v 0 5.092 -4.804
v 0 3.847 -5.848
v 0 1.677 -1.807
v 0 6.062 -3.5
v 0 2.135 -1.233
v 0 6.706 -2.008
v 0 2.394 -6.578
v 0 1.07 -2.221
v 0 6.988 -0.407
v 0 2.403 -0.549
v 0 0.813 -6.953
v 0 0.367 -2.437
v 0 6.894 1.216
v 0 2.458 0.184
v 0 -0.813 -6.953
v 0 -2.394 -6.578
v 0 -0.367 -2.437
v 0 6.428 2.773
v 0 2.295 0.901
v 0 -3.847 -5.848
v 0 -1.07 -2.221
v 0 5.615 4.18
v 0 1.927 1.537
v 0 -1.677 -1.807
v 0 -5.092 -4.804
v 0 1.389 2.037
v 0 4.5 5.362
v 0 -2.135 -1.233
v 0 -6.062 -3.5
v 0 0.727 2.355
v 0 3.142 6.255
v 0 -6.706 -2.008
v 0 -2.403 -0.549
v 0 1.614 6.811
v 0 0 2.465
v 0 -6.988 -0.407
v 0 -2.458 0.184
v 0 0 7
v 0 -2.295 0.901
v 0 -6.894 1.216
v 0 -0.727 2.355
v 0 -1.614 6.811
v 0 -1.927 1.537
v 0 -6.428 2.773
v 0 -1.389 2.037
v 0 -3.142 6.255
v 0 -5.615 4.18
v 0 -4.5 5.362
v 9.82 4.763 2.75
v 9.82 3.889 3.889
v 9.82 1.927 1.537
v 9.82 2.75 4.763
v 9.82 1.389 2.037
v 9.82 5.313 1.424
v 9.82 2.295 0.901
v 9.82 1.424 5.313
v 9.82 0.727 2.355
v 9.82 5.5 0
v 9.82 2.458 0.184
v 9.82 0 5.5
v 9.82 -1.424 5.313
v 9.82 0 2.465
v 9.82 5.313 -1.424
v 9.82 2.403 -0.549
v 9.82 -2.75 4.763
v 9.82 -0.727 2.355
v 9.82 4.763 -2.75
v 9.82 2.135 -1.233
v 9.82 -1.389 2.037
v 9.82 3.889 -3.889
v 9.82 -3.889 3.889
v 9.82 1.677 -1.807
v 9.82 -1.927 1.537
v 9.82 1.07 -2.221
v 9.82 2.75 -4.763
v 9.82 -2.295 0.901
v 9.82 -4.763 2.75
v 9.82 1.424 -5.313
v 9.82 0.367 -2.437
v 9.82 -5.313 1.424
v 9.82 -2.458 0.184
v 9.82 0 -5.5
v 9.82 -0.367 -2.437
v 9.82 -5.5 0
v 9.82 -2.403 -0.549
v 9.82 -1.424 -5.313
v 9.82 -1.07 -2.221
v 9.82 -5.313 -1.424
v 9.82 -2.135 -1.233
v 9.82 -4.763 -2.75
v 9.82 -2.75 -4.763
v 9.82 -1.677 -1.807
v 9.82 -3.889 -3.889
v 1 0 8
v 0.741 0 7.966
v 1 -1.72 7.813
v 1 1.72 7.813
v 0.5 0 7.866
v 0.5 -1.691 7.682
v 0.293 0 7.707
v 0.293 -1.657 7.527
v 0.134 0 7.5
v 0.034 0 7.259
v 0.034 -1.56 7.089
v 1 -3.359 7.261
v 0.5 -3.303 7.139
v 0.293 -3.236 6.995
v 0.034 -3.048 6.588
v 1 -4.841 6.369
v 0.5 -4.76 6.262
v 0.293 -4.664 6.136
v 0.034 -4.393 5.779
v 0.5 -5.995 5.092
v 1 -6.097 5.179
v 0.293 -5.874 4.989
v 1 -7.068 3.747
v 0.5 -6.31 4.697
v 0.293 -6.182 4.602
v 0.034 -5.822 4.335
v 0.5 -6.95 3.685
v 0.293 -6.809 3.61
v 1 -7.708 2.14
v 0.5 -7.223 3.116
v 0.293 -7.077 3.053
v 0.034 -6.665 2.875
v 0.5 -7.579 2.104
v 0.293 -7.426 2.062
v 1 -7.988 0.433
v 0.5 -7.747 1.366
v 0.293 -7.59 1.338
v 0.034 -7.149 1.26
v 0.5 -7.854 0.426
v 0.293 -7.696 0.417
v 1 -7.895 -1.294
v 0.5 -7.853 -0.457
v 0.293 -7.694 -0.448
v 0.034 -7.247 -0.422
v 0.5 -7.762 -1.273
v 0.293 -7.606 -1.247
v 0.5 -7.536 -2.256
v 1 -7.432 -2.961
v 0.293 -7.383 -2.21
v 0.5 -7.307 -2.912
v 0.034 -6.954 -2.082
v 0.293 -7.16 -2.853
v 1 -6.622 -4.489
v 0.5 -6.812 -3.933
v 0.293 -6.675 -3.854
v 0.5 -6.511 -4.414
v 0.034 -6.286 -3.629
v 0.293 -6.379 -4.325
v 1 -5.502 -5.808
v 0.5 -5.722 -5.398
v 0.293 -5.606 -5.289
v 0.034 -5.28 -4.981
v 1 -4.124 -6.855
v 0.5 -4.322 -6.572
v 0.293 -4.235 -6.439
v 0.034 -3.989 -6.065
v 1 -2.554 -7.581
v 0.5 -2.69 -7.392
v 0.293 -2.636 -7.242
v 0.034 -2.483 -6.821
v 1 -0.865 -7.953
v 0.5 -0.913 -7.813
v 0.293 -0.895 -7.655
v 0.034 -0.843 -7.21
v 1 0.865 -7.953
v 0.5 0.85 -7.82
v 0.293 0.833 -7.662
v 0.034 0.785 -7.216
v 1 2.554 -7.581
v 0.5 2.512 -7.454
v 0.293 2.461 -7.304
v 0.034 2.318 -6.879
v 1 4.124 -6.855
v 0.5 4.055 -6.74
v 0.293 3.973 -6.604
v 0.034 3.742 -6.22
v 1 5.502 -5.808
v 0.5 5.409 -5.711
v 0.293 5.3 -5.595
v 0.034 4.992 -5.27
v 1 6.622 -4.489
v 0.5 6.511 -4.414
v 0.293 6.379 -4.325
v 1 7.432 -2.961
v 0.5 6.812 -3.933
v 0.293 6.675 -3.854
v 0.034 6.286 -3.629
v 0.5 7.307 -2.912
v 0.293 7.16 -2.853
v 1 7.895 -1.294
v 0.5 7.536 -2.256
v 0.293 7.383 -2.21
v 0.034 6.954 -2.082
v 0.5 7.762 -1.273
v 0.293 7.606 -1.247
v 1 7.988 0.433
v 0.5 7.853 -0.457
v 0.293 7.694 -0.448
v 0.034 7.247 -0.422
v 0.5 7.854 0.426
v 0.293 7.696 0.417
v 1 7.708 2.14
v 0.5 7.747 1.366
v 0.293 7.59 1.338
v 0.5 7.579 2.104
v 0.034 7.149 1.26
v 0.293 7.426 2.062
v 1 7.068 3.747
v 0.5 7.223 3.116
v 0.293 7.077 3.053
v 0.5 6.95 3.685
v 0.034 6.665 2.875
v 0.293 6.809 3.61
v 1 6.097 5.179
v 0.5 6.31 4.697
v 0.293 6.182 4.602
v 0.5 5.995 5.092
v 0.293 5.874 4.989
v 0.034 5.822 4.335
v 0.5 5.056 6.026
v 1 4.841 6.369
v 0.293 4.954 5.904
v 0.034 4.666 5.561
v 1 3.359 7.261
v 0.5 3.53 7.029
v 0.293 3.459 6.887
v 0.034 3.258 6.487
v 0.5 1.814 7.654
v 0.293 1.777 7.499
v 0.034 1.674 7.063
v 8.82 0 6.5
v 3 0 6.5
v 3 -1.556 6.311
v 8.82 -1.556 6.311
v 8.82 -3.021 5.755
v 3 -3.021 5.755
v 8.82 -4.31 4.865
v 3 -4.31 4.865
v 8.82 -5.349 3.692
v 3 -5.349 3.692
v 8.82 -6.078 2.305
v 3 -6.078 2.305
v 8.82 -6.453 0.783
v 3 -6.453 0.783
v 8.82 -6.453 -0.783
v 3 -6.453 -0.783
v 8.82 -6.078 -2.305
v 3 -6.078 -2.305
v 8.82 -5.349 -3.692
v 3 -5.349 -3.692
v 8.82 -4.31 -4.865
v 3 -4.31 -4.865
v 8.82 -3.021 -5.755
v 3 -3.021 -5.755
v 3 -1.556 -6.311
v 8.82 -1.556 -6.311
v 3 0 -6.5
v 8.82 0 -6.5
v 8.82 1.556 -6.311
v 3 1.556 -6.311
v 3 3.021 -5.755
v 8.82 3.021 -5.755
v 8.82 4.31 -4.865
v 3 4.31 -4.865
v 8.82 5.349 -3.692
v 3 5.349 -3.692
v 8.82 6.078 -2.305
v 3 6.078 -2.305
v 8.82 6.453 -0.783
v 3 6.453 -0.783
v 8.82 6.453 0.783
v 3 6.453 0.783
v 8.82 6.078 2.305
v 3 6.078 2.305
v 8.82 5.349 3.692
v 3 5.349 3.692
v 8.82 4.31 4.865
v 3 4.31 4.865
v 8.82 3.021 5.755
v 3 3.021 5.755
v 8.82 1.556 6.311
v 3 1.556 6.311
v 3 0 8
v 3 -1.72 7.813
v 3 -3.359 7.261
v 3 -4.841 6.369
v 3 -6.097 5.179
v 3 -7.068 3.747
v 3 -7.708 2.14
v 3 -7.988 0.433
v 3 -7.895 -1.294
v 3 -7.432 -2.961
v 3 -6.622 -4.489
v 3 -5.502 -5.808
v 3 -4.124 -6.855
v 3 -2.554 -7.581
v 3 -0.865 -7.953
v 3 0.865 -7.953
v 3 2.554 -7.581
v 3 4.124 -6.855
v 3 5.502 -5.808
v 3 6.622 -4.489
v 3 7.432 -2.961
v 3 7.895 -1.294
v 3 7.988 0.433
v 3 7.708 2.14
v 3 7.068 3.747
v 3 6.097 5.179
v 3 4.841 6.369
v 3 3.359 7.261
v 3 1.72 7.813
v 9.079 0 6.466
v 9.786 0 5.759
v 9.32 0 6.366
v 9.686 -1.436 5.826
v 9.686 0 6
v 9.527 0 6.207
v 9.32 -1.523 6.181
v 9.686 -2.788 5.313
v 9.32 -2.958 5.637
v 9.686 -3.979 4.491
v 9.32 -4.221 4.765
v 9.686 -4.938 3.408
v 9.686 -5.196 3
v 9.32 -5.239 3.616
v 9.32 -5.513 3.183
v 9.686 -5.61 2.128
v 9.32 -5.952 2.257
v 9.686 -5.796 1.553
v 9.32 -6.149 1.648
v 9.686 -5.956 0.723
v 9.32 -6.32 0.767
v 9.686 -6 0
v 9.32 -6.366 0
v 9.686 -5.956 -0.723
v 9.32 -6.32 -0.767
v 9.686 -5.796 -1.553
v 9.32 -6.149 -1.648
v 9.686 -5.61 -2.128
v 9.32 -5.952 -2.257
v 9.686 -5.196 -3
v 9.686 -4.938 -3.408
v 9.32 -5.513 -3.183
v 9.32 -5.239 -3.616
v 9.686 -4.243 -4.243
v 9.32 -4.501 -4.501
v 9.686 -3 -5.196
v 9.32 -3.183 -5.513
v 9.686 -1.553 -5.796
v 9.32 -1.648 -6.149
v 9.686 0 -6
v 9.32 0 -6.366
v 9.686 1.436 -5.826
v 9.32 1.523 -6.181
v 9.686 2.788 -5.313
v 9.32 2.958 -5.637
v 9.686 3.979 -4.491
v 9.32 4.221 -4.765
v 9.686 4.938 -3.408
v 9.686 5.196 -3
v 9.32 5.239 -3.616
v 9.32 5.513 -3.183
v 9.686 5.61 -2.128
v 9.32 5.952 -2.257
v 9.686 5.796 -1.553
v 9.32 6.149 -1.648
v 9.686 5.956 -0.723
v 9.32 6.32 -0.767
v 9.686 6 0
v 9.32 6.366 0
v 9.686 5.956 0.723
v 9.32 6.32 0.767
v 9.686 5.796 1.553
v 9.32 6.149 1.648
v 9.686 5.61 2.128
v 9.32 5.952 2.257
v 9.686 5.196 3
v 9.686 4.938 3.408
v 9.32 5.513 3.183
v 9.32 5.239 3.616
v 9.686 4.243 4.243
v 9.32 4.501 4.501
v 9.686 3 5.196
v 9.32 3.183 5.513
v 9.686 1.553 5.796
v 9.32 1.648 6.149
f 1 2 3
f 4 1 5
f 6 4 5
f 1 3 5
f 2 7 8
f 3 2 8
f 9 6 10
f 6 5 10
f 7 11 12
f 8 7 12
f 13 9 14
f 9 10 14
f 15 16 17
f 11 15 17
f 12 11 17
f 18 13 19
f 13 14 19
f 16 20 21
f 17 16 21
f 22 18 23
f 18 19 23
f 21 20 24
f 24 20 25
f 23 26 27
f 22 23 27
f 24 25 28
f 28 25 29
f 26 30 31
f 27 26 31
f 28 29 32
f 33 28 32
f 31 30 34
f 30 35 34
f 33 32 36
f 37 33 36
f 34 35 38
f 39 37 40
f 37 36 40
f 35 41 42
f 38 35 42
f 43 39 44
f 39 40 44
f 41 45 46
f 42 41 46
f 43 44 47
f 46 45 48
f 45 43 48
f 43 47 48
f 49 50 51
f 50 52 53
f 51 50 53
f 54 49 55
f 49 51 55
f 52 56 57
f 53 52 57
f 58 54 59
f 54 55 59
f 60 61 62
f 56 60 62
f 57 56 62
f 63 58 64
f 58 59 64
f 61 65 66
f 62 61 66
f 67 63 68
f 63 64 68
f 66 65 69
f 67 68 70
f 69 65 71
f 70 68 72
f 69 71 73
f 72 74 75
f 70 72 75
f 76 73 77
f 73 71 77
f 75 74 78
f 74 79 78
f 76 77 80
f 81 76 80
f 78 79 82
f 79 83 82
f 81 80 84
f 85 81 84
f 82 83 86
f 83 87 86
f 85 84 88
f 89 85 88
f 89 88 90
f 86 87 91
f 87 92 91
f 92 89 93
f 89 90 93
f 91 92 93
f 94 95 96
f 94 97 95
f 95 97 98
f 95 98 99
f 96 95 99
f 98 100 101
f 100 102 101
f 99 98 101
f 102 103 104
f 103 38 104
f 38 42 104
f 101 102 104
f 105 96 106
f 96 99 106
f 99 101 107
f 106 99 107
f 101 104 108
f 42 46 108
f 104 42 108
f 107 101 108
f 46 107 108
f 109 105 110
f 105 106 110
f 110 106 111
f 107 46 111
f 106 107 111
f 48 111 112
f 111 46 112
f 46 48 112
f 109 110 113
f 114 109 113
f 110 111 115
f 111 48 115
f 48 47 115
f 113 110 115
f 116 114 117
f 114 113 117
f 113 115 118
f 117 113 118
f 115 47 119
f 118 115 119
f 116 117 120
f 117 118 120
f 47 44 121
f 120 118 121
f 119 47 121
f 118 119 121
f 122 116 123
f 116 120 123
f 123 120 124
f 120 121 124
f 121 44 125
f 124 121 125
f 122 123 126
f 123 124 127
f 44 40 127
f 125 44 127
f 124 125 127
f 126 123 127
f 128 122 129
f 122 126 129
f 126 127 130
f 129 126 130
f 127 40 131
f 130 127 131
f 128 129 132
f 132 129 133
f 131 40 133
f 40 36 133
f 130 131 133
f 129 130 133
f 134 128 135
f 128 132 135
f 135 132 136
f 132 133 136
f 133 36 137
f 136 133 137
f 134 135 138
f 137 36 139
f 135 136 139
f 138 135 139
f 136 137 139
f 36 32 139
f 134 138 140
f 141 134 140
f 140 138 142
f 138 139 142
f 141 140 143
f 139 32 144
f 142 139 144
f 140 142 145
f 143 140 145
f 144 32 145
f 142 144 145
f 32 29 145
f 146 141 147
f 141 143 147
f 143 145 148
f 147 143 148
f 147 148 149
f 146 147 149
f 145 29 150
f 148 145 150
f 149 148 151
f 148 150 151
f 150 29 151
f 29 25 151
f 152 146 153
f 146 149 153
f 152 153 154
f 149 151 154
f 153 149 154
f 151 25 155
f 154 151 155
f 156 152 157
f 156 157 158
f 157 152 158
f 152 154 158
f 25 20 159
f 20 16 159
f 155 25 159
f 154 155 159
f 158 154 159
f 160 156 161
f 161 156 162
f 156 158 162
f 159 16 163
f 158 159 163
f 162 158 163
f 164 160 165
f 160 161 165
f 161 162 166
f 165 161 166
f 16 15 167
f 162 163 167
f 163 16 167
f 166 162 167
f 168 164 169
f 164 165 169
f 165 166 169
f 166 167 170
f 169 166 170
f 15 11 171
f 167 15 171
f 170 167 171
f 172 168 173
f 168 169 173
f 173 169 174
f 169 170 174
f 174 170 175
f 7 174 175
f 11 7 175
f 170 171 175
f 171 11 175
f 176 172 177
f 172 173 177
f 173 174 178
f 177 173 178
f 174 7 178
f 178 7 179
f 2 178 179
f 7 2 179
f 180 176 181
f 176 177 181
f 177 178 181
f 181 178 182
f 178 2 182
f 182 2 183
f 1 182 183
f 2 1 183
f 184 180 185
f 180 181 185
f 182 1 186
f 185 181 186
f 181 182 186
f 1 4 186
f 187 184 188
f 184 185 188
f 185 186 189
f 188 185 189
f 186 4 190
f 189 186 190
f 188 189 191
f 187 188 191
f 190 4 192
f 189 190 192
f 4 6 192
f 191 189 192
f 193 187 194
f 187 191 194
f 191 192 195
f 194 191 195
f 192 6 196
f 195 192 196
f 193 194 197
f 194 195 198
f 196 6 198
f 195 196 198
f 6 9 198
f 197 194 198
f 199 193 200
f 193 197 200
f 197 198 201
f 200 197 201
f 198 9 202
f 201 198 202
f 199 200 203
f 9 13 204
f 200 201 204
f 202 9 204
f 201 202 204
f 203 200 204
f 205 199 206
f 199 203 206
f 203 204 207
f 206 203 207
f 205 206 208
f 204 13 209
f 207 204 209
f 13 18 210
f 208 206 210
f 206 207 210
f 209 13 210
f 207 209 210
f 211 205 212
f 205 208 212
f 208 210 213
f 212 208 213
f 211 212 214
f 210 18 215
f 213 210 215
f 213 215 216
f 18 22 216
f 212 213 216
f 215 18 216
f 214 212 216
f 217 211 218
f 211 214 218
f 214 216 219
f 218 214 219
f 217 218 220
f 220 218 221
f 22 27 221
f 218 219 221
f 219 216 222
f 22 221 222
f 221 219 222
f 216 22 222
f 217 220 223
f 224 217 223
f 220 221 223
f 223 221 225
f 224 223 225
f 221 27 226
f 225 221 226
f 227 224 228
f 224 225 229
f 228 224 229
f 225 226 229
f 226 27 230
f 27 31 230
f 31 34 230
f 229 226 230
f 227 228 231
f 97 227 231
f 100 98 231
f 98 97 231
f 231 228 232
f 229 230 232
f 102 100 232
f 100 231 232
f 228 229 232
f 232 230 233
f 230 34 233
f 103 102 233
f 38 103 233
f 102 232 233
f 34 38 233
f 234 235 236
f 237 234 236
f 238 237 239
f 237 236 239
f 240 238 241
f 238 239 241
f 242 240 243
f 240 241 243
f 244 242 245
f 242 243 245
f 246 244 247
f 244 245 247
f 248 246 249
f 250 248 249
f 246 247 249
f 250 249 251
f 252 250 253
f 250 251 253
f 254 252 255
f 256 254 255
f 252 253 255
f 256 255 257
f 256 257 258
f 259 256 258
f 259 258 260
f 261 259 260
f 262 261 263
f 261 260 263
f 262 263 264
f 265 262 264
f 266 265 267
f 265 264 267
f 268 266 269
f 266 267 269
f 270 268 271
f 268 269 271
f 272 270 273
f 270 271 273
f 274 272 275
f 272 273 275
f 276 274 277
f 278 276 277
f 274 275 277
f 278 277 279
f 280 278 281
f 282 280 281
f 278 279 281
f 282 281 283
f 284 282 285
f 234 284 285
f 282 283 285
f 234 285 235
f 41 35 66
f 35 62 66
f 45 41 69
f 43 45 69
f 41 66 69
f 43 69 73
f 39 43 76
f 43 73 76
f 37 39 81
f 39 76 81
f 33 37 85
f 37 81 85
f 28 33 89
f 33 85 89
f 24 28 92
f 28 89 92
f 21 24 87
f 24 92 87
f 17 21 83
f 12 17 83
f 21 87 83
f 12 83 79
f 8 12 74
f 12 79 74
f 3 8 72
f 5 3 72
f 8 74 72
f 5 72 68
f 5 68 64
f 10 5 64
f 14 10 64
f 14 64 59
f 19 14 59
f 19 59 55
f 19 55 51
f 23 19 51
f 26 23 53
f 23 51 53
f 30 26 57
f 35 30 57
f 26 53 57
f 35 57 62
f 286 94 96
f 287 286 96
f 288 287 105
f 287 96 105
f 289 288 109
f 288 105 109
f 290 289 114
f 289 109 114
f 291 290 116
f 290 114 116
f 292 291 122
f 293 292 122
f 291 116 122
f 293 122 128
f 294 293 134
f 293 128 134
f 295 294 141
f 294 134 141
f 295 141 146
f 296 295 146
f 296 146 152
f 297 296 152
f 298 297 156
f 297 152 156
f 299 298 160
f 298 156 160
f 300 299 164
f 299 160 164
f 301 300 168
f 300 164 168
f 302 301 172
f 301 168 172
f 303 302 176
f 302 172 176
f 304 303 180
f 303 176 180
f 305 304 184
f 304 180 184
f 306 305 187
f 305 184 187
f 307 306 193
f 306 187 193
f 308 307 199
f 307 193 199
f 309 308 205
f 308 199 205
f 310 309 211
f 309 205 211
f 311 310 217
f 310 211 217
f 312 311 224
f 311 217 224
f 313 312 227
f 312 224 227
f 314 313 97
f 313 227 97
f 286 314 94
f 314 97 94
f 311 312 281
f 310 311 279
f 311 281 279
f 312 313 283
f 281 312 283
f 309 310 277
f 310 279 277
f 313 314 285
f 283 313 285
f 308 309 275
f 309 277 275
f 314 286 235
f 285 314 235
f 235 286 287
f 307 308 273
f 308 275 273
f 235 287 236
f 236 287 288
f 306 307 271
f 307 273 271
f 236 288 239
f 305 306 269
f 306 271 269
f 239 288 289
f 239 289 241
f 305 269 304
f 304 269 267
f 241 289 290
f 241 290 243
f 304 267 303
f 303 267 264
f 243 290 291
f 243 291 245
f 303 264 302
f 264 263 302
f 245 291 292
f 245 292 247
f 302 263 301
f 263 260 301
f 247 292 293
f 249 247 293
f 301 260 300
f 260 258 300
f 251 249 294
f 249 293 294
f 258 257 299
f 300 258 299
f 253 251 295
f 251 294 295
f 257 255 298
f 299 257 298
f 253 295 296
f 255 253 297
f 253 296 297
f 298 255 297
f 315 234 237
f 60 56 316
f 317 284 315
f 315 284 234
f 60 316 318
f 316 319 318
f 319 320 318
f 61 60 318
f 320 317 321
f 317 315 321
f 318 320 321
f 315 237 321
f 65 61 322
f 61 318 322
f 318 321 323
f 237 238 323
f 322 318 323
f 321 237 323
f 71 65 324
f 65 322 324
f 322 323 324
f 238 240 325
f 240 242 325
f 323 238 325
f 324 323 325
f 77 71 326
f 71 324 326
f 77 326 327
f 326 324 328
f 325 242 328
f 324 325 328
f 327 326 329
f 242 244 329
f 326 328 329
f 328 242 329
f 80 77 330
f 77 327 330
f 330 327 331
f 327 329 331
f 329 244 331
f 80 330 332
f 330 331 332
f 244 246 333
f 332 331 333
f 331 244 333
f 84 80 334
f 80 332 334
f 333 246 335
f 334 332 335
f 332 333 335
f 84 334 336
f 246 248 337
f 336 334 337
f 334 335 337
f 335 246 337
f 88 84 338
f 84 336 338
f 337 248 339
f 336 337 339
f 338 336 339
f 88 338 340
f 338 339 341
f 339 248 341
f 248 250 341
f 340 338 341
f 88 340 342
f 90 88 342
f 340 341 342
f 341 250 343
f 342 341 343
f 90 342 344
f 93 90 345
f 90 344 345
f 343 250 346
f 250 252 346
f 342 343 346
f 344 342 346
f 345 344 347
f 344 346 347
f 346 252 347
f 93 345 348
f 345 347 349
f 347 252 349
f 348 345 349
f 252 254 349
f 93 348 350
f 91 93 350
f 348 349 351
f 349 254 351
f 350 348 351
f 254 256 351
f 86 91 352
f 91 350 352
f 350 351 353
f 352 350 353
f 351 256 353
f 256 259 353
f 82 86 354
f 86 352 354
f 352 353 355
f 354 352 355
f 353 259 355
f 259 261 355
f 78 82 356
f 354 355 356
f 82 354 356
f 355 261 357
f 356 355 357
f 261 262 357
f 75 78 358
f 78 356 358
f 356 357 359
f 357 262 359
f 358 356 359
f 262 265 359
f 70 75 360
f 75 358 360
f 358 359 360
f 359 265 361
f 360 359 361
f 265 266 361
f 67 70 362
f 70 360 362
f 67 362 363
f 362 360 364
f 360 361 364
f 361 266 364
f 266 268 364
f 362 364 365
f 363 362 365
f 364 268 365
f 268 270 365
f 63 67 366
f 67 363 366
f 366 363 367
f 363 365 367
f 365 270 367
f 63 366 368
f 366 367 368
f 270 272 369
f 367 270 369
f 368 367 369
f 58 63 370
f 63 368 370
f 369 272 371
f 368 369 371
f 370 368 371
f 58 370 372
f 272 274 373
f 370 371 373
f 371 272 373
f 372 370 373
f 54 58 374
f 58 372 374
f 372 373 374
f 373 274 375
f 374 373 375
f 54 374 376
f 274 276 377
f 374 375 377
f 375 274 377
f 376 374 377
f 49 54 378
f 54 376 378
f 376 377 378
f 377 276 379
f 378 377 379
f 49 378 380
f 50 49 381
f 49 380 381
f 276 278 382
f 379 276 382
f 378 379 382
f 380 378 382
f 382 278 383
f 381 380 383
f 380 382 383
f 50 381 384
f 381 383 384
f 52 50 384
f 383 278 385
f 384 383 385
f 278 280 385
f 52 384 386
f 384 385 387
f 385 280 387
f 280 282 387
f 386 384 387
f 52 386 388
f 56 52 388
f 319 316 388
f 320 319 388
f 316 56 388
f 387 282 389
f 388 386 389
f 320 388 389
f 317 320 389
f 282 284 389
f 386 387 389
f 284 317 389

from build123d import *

# Parameters (mm, degrees)
REDONDEO1_R = 1


with BuildPart() as part:
    # Croquis1 → Revolución1 (revolve)
    with BuildSketch(Plane.XY, mode=Mode.PRIVATE) as revoluci_n1_sk:
        Polygon((0, 2.465), (9.82, 2.465), (9.82, 6.5), (3, 6.5), (3, 8), (0, 8), align=None)
    revolve(revoluci_n1_sk.sketch.rotate(Axis((0, 0, 0), (1, 0, 0)), 90), axis=Axis((0, 0, 0), (1, 0, 0)))

    # Redondeo1
    redondeo1_edges = [part.edges().sort_by_distance(p)[0] for p in [
        (0, 0, -8),
        (9.82, 0, -6.5),
    ]]
    fillet(redondeo1_edges, radius=REDONDEO1_R)


solid = part.part
